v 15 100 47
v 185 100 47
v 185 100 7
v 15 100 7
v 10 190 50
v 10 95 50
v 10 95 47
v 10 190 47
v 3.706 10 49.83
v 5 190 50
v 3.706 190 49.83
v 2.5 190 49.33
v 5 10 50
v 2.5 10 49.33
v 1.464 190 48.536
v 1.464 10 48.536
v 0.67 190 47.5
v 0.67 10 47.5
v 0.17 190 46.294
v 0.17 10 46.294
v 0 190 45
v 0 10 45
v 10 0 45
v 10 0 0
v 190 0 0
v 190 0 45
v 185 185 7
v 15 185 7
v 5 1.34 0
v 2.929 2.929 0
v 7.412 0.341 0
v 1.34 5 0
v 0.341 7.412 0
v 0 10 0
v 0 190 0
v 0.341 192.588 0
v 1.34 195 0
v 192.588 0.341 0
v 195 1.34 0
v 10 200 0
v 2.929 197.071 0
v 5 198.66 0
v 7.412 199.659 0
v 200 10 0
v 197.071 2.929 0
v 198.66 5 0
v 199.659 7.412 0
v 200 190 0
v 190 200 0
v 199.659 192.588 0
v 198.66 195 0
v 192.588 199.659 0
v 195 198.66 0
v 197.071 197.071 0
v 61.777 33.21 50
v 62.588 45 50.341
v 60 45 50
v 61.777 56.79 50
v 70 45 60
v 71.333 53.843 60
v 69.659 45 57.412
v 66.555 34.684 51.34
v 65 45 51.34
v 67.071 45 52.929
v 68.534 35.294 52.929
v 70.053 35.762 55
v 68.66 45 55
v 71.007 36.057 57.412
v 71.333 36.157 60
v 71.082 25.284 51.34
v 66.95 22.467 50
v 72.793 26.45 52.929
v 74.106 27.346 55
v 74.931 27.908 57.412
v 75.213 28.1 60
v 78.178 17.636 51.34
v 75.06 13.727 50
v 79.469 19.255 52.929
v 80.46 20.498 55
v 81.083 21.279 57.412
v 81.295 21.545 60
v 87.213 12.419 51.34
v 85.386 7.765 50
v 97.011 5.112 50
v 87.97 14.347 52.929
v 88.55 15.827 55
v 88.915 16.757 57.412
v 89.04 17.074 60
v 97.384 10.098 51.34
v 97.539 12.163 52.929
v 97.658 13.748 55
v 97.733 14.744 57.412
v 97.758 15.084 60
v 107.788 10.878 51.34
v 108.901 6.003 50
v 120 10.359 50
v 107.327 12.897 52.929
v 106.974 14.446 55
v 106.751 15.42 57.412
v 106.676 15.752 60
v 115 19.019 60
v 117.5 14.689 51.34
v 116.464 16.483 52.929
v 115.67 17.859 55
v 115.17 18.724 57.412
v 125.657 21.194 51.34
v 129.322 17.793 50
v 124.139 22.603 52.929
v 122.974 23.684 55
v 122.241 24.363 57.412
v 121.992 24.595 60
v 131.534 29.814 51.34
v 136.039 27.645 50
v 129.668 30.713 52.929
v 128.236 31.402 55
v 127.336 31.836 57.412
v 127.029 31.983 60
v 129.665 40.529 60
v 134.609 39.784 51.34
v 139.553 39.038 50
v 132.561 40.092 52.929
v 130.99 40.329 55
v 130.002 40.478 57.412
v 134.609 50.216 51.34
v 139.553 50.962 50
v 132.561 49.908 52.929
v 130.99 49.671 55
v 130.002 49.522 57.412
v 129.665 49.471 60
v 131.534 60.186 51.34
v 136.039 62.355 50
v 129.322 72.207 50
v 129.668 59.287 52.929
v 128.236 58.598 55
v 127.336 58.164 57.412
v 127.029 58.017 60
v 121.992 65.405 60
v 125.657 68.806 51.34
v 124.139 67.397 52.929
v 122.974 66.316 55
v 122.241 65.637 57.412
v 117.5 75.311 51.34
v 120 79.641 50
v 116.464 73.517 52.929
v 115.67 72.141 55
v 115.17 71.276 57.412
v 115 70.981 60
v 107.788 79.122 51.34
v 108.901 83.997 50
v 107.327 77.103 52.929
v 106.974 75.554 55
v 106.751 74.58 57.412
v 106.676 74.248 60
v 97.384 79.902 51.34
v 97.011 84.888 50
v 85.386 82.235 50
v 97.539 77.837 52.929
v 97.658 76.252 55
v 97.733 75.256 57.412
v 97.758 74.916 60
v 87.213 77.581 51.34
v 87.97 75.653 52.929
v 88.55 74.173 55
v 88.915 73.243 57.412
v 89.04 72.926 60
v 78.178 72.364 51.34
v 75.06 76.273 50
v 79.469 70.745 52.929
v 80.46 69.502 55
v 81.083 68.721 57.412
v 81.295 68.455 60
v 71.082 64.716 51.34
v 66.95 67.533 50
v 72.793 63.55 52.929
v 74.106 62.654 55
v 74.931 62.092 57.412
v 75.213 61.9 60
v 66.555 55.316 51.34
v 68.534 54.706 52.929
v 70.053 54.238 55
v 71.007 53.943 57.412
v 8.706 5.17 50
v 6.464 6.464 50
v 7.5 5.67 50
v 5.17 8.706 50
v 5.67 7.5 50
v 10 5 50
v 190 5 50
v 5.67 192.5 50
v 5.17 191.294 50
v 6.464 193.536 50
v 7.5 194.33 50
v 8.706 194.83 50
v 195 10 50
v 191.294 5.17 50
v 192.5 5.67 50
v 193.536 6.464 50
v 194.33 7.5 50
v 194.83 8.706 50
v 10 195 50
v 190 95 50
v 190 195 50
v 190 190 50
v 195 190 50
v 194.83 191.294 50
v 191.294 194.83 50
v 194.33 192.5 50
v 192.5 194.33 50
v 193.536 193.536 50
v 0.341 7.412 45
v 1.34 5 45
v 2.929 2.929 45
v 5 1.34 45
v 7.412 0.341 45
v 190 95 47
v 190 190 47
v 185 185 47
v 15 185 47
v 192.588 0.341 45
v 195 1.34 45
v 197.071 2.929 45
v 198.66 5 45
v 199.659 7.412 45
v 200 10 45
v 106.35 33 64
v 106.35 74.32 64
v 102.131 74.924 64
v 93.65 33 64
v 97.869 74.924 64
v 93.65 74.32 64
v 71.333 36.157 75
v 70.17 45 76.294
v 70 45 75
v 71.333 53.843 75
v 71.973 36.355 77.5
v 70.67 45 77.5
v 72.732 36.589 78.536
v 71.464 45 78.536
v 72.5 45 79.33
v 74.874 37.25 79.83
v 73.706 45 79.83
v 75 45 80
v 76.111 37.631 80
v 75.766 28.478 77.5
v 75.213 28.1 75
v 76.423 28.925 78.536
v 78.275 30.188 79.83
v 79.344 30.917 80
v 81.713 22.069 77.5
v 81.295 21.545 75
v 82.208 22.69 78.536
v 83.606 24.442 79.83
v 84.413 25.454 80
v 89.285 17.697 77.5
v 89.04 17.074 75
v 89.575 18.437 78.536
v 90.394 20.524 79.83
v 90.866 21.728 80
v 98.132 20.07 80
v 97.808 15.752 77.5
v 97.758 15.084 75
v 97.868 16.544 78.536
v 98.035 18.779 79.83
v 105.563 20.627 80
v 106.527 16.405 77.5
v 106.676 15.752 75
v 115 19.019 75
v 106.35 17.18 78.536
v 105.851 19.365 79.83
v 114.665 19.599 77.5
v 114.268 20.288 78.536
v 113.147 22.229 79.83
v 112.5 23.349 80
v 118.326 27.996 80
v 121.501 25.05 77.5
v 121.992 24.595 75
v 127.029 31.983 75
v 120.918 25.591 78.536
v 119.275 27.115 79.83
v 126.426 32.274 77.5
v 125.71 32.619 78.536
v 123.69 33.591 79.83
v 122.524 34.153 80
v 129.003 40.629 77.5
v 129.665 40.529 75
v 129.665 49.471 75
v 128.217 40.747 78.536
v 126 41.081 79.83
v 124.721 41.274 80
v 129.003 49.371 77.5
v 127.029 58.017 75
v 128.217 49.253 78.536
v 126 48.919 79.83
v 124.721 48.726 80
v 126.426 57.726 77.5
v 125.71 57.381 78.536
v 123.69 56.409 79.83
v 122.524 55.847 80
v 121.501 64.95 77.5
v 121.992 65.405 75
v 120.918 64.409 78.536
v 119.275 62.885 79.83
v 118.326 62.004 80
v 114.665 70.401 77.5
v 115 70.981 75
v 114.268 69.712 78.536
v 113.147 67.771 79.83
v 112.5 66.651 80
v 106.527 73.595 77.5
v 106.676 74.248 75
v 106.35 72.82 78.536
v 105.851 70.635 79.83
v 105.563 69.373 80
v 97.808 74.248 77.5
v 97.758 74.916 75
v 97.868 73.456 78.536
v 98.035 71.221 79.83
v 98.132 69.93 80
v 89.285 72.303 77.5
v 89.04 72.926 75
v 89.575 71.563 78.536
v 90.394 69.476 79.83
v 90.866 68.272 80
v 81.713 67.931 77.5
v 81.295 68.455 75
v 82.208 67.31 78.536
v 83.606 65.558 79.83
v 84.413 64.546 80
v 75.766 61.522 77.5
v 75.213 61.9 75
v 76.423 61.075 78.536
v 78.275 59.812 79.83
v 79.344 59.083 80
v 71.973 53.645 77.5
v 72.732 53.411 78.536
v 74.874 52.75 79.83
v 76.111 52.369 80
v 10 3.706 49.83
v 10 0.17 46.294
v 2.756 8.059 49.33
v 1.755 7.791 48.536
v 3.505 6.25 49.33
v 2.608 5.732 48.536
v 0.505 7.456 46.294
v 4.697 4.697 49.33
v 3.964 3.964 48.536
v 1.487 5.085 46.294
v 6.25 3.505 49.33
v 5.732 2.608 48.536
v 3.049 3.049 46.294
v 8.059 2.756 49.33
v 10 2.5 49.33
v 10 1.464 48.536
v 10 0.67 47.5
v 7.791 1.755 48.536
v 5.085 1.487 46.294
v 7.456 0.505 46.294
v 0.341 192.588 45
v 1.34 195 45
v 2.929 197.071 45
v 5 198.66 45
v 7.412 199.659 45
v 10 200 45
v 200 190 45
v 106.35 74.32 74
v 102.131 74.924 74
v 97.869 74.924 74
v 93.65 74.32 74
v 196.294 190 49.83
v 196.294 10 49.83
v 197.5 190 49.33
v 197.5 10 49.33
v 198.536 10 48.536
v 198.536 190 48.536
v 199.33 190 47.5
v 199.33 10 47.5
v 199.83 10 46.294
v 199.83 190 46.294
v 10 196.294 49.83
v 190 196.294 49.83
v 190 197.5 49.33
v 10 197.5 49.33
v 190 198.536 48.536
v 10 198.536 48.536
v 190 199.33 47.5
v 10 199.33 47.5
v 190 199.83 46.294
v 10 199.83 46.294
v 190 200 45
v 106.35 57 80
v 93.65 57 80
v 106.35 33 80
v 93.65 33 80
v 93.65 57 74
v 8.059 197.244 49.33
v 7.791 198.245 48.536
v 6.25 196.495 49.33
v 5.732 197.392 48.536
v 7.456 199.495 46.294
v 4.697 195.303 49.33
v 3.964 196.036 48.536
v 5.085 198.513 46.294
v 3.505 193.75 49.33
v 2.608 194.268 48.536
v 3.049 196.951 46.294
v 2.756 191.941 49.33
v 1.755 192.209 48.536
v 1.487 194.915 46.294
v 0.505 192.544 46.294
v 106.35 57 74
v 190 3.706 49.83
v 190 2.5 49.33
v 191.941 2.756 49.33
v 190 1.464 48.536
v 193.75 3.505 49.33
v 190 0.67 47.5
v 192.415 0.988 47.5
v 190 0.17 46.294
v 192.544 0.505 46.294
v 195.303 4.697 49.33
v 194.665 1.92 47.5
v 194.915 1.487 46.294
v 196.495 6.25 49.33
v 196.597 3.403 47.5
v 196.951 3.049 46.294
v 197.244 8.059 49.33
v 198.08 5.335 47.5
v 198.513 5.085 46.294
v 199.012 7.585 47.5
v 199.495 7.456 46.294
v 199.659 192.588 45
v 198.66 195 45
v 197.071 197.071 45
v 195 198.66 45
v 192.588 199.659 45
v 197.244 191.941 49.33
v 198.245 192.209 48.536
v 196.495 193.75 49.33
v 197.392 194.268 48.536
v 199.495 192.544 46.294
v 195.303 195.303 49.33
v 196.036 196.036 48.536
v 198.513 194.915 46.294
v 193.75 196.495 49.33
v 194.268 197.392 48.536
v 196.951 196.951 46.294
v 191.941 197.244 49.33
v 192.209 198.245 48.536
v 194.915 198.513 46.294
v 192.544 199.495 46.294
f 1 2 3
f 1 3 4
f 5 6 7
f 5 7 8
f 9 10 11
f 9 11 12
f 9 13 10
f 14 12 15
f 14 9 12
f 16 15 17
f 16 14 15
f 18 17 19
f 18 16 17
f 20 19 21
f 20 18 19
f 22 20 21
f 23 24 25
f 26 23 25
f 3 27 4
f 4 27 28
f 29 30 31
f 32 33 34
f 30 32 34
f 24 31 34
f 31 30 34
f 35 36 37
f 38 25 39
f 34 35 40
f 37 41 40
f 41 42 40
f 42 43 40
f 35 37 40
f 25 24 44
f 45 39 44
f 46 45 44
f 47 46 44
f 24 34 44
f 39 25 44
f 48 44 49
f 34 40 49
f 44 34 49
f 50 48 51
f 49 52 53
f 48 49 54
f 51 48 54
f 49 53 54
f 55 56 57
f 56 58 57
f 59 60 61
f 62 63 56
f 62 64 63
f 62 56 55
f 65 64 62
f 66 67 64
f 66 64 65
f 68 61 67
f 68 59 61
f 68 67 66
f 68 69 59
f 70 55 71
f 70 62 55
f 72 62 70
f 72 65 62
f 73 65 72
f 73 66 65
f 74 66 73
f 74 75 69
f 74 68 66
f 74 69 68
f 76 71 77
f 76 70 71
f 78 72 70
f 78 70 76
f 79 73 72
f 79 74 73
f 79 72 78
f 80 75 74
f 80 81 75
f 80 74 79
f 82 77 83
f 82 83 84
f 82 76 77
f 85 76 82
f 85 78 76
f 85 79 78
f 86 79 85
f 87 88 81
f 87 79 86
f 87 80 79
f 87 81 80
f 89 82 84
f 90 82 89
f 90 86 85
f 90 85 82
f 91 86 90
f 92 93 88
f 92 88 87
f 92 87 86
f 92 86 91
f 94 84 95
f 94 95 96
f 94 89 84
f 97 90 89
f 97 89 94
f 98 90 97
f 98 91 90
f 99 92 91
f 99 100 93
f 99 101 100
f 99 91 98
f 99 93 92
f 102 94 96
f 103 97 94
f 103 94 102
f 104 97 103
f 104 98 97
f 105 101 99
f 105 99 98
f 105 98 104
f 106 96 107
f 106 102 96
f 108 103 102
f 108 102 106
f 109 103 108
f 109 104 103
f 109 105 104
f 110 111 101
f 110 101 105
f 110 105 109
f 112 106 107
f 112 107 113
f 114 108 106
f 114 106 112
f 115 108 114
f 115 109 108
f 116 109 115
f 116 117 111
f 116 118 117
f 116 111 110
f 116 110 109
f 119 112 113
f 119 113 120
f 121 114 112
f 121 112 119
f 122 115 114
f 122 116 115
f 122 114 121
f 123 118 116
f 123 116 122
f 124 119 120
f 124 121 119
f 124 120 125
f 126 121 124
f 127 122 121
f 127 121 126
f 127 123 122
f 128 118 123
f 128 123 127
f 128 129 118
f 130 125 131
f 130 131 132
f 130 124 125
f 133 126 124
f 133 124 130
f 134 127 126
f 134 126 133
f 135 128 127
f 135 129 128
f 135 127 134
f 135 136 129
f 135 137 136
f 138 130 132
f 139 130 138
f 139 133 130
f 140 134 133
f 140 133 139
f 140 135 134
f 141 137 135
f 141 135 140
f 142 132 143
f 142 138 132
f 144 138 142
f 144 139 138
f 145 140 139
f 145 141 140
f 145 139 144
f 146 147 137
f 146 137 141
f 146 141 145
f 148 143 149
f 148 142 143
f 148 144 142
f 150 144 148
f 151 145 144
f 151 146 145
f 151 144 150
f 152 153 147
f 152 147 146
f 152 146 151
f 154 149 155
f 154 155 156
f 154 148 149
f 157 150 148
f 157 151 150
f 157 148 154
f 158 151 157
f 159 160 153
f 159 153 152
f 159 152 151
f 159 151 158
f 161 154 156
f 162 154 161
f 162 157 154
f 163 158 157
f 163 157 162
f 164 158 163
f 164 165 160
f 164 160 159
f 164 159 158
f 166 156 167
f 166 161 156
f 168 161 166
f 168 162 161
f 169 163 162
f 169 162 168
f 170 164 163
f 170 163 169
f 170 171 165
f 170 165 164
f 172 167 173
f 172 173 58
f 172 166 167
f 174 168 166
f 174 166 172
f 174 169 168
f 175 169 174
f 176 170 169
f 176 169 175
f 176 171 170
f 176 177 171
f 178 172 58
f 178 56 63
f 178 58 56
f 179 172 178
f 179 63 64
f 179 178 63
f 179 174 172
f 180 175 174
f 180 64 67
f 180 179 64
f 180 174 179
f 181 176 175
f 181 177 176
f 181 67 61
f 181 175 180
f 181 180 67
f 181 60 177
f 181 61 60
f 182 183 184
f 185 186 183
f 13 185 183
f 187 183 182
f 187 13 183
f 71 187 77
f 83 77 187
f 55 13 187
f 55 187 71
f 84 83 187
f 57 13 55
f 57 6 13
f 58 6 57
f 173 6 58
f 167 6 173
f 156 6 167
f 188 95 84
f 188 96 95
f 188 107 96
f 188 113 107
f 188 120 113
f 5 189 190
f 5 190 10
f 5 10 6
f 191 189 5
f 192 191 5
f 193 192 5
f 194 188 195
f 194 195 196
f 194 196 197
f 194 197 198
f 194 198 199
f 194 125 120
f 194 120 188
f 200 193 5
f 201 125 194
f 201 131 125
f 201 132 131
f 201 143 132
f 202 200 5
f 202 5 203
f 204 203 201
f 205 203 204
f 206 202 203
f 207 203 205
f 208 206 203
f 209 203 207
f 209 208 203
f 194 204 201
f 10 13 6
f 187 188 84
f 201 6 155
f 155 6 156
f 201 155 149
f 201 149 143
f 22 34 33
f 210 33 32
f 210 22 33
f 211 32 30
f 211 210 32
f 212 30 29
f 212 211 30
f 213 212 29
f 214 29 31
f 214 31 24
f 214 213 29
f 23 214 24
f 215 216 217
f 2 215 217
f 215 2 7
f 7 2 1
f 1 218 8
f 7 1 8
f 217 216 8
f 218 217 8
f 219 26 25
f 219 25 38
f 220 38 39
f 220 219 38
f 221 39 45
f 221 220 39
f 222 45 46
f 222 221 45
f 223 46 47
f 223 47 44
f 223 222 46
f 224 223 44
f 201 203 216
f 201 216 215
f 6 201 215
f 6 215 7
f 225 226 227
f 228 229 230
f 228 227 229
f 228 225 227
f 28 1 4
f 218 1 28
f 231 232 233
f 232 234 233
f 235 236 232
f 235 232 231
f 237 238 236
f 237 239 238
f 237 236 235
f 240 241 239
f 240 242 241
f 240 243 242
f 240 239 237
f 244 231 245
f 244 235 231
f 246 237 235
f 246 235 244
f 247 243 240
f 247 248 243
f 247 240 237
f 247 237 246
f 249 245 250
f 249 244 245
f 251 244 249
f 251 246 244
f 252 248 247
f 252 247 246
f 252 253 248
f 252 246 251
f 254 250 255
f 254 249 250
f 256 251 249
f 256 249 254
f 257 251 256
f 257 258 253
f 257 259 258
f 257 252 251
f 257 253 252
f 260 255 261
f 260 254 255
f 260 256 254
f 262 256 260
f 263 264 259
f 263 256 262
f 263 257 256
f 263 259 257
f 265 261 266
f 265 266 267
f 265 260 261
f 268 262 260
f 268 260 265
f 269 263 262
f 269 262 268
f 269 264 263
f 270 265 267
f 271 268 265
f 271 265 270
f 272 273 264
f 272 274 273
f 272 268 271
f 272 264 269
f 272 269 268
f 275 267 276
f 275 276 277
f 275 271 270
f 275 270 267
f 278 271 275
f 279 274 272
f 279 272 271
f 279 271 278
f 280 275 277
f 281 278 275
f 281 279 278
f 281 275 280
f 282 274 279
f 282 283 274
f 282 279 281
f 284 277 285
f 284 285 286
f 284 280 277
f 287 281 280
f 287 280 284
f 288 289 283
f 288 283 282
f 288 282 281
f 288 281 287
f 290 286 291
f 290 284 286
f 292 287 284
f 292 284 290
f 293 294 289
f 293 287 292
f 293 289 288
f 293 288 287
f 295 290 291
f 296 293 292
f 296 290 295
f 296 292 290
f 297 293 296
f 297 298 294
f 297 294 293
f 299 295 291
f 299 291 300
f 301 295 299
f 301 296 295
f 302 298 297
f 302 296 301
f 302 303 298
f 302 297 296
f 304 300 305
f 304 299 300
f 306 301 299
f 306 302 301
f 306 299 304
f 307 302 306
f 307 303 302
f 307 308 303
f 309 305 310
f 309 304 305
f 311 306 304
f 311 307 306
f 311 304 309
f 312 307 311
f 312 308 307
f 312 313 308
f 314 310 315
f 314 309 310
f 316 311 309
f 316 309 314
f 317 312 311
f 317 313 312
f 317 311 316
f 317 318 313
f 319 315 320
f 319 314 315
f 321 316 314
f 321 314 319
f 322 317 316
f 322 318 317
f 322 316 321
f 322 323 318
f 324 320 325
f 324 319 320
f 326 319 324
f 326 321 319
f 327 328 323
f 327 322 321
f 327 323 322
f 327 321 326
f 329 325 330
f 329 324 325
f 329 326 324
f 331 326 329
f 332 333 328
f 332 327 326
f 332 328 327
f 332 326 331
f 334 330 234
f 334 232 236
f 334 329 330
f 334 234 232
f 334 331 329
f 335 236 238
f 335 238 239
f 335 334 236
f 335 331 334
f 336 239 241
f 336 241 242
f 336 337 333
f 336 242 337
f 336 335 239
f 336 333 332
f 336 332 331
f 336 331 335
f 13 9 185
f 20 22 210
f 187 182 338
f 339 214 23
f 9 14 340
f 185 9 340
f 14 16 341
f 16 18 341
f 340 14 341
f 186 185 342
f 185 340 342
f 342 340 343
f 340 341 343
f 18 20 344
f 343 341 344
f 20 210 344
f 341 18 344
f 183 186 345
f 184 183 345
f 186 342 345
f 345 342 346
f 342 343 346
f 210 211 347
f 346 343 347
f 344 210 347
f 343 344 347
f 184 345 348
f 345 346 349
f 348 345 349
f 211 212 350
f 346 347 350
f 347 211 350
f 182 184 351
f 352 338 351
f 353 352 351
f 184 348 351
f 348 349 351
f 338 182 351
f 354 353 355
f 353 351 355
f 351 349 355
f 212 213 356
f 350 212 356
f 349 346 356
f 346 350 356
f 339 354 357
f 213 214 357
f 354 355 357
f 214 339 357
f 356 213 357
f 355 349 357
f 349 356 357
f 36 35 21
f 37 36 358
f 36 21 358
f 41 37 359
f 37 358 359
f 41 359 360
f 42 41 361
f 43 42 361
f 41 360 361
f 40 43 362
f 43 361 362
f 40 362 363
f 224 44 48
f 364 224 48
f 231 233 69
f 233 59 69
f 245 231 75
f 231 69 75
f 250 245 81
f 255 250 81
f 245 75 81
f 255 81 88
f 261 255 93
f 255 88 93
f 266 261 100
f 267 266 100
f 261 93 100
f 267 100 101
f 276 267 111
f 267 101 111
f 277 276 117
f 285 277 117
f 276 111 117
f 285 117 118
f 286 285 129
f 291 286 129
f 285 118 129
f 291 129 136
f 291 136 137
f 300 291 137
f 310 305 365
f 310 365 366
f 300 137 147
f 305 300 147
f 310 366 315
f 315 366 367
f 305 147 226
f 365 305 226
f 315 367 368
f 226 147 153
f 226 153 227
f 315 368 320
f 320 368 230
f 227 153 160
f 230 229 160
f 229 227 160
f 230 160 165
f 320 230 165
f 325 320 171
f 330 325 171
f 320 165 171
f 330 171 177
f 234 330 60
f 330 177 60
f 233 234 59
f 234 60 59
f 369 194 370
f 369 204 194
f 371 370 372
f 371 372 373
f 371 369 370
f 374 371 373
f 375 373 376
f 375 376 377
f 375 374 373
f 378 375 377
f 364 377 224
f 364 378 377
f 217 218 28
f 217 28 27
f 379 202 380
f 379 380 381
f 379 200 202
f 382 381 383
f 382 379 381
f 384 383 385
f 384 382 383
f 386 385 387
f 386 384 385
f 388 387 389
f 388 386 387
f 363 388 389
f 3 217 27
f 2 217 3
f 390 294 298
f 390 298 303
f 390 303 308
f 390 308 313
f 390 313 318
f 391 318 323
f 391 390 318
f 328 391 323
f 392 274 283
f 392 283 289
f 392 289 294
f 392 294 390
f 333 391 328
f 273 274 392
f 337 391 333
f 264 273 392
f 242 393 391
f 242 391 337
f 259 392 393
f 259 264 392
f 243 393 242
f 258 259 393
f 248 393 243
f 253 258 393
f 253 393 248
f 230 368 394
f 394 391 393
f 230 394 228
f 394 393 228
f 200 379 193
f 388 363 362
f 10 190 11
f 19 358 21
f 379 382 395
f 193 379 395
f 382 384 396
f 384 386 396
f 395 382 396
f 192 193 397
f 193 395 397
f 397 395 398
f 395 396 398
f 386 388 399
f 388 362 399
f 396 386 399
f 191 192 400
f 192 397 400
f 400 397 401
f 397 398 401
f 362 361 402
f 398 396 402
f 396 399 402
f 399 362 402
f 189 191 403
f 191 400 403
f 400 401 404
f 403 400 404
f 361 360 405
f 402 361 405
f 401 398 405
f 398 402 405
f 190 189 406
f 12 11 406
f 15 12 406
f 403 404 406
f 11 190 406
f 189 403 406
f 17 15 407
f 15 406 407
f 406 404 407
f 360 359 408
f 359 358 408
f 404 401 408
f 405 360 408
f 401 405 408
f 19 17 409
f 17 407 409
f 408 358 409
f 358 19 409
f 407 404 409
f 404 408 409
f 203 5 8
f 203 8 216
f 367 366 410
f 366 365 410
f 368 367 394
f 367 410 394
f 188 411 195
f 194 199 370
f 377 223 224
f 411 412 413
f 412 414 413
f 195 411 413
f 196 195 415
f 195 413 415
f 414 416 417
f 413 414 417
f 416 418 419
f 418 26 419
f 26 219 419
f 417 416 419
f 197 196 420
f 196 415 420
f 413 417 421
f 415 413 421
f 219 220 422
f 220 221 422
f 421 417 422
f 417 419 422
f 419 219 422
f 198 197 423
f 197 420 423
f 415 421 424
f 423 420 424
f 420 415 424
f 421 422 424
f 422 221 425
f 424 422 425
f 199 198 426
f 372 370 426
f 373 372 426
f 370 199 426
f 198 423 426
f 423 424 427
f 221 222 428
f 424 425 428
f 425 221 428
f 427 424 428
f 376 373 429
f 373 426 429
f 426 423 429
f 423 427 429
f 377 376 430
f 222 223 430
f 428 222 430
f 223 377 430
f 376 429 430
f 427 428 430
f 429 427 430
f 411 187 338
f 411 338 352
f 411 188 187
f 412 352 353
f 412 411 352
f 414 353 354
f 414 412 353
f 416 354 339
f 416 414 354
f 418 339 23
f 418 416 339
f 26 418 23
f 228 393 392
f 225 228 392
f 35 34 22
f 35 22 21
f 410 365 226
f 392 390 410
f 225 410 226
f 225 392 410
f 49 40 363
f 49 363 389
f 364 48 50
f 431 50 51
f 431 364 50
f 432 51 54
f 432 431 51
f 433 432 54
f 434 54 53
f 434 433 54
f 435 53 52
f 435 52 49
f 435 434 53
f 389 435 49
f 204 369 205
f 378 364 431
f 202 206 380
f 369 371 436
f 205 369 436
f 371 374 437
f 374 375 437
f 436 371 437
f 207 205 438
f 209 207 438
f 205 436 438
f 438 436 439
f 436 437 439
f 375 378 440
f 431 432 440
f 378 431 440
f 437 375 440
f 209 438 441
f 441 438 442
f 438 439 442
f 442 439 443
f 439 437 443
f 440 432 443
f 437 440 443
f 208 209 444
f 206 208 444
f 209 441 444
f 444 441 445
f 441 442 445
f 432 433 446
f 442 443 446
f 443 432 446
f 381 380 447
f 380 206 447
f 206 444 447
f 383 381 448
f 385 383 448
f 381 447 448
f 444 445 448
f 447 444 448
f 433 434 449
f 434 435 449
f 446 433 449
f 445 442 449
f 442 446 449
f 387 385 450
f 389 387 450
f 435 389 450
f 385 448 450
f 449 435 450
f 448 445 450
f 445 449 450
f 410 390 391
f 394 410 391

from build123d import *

# Parameters (mm, degrees)
SKICA1_W                 = 200.00000000000003
SKICA1_H                 = 200.00000000000003
P_IDAT_VYSUNUT_M3_DEPTH  = 50
ZAOBLIT1_R               = 10
SKICA2_R                 = 29.999999999999996
P_IDAT_VYSUNUT_M4_DEPTH  = 30
ZAOBLIT2_R               = 10
ZAOBLIT3_R               = 5
ODEBRAT_VYSUNUT_M1_DEPTH = 3
ODEBRAT_VYSUNUT_M2_DEPTH = 40
ZAOBLIT5_R               = 5
ODEBRAT_VYSUNUT_M3_DEPTH = 16
SKICA10_W                = 12.699999999999989
SKICA10_H                = 10
ODEBRAT_VYSUNUT_M4_DEPTH = 259.5517356352496


with BuildPart() as part:
    # Skica1 → Přidat vysunutím3 (new body)
    with BuildSketch(Plane.XY):
        with Locations((100.00000000000001, 100.00000000000001)):
            Rectangle(SKICA1_W, SKICA1_H)
    extrude(amount=P_IDAT_VYSUNUT_M3_DEPTH)

    # Zaoblit1
    zaoblit1_edges = [part.edges().sort_by_distance(p)[0] for p in [
        (0, 200, 25),
        (200, 200, 25),
        (200, 0, 25),
        (0, 0, 25),
    ]]
    fillet(zaoblit1_edges, radius=ZAOBLIT1_R)

    # Skica2 → Přidat vysunutím4 (add)
    with BuildSketch(Plane.XY.offset(50)):
        with Locations(Location((100, 45.000000000000014, 0), (0, 0, 180))):
            Circle(SKICA2_R)
    extrude(amount=P_IDAT_VYSUNUT_M4_DEPTH)

    # Zaoblit2
    zaoblit2_edges = [part.edges().sort_by_distance(p)[0] for p in [
        (130, 45.00000000000001, 50),
    ]]
    fillet(zaoblit2_edges, radius=ZAOBLIT2_R)

    # Zaoblit3
    zaoblit3_edges = [part.edges().sort_by_distance(p)[0] for p in [
        (130, 45.00000000000001, 80),
    ]]
    fillet(zaoblit3_edges, radius=ZAOBLIT3_R)

    # Skica4 → Odebrat vysunutím1 (cut)
    with BuildSketch(Plane.XY.offset(50)):
        Polygon((10, 190), (190, 190), (190, 95.00000000000001), (10.000000000000012, 95.00000000000001), align=None)
    extrude(amount=-ODEBRAT_VYSUNUT_M1_DEPTH, mode=Mode.SUBTRACT)

    # Skica7 → Odebrat vysunutím2 (cut)
    with BuildSketch(Plane.XY.offset(47)):
        Polygon((14.999999999999998, 185), (185, 185), (185, 100.00000000000001), (15.00000000000001, 100.00000000000001), align=None)
    extrude(amount=-ODEBRAT_VYSUNUT_M2_DEPTH, mode=Mode.SUBTRACT)

    # Zaoblit5
    zaoblit5_edges = [part.edges().sort_by_distance(p)[0] for p in [
        (200, 100, 50),
        (100, 0, 50),
        (0, 100, 50),
        (100, 200, 50),
        (2.9289321881345236, 2.9289321881345227, 50),
        (2.9289321881345236, 197.07106781186548, 50),
        (197.07106781186548, 197.07106781186548, 50),
        (197.07106781186548, 2.9289321881345236, 50),
    ]]
    fillet(zaoblit5_edges, radius=ZAOBLIT5_R)

    # Skica9 → Odebrat vysunutím3 (cut)
    with BuildSketch(Plane.XY.offset(80)):
        Polygon((99.99999999999999, 45.000000000000014), (93.64999999999999, 57.000000000000014), (93.64999999999999, 45.000000000000014), align=None)
        Polygon((100, 57.000000000000014), (93.64999999999999, 57.000000000000014), (99.99999999999999, 45.000000000000014), align=None)
        Polygon((100, 57.000000000000014), (100, 45.00000000000002), (106.35, 57.000000000000014), align=None)
        Polygon((106.35, 57.000000000000014), (100, 45.00000000000003), (106.35, 45.000000000000014), align=None)
        Polygon((106.35, 45.000000000000014), (100, 45.000000000000014), (106.35, 33.000000000000014), align=None)
        Polygon((106.35, 33.000000000000014), (99.99999999999999, 45.000000000000014), (100, 33.000000000000014), align=None)
        Polygon((100, 33.000000000000014), (100, 45.00000000000002), (93.64999999999999, 33.000000000000014), align=None)
        Polygon((93.64999999999999, 33.000000000000014), (100, 45.00000000000003), (93.64999999999999, 45.000000000000014), align=None)
    extrude(amount=-ODEBRAT_VYSUNUT_M3_DEPTH, mode=Mode.SUBTRACT)

    # Skica10 → Odebrat vysunutím4 (cut, through all)
    with BuildSketch(Plane(origin=(0, 57.000000000000014, 0), x_dir=(-1, 0, 0), z_dir=(0, -1, 0))):
        with Locations((-99.99999999999999, -69)):
            Rectangle(SKICA10_W, SKICA10_H)
    extrude(amount=-ODEBRAT_VYSUNUT_M4_DEPTH, mode=Mode.SUBTRACT)


solid = part.part
